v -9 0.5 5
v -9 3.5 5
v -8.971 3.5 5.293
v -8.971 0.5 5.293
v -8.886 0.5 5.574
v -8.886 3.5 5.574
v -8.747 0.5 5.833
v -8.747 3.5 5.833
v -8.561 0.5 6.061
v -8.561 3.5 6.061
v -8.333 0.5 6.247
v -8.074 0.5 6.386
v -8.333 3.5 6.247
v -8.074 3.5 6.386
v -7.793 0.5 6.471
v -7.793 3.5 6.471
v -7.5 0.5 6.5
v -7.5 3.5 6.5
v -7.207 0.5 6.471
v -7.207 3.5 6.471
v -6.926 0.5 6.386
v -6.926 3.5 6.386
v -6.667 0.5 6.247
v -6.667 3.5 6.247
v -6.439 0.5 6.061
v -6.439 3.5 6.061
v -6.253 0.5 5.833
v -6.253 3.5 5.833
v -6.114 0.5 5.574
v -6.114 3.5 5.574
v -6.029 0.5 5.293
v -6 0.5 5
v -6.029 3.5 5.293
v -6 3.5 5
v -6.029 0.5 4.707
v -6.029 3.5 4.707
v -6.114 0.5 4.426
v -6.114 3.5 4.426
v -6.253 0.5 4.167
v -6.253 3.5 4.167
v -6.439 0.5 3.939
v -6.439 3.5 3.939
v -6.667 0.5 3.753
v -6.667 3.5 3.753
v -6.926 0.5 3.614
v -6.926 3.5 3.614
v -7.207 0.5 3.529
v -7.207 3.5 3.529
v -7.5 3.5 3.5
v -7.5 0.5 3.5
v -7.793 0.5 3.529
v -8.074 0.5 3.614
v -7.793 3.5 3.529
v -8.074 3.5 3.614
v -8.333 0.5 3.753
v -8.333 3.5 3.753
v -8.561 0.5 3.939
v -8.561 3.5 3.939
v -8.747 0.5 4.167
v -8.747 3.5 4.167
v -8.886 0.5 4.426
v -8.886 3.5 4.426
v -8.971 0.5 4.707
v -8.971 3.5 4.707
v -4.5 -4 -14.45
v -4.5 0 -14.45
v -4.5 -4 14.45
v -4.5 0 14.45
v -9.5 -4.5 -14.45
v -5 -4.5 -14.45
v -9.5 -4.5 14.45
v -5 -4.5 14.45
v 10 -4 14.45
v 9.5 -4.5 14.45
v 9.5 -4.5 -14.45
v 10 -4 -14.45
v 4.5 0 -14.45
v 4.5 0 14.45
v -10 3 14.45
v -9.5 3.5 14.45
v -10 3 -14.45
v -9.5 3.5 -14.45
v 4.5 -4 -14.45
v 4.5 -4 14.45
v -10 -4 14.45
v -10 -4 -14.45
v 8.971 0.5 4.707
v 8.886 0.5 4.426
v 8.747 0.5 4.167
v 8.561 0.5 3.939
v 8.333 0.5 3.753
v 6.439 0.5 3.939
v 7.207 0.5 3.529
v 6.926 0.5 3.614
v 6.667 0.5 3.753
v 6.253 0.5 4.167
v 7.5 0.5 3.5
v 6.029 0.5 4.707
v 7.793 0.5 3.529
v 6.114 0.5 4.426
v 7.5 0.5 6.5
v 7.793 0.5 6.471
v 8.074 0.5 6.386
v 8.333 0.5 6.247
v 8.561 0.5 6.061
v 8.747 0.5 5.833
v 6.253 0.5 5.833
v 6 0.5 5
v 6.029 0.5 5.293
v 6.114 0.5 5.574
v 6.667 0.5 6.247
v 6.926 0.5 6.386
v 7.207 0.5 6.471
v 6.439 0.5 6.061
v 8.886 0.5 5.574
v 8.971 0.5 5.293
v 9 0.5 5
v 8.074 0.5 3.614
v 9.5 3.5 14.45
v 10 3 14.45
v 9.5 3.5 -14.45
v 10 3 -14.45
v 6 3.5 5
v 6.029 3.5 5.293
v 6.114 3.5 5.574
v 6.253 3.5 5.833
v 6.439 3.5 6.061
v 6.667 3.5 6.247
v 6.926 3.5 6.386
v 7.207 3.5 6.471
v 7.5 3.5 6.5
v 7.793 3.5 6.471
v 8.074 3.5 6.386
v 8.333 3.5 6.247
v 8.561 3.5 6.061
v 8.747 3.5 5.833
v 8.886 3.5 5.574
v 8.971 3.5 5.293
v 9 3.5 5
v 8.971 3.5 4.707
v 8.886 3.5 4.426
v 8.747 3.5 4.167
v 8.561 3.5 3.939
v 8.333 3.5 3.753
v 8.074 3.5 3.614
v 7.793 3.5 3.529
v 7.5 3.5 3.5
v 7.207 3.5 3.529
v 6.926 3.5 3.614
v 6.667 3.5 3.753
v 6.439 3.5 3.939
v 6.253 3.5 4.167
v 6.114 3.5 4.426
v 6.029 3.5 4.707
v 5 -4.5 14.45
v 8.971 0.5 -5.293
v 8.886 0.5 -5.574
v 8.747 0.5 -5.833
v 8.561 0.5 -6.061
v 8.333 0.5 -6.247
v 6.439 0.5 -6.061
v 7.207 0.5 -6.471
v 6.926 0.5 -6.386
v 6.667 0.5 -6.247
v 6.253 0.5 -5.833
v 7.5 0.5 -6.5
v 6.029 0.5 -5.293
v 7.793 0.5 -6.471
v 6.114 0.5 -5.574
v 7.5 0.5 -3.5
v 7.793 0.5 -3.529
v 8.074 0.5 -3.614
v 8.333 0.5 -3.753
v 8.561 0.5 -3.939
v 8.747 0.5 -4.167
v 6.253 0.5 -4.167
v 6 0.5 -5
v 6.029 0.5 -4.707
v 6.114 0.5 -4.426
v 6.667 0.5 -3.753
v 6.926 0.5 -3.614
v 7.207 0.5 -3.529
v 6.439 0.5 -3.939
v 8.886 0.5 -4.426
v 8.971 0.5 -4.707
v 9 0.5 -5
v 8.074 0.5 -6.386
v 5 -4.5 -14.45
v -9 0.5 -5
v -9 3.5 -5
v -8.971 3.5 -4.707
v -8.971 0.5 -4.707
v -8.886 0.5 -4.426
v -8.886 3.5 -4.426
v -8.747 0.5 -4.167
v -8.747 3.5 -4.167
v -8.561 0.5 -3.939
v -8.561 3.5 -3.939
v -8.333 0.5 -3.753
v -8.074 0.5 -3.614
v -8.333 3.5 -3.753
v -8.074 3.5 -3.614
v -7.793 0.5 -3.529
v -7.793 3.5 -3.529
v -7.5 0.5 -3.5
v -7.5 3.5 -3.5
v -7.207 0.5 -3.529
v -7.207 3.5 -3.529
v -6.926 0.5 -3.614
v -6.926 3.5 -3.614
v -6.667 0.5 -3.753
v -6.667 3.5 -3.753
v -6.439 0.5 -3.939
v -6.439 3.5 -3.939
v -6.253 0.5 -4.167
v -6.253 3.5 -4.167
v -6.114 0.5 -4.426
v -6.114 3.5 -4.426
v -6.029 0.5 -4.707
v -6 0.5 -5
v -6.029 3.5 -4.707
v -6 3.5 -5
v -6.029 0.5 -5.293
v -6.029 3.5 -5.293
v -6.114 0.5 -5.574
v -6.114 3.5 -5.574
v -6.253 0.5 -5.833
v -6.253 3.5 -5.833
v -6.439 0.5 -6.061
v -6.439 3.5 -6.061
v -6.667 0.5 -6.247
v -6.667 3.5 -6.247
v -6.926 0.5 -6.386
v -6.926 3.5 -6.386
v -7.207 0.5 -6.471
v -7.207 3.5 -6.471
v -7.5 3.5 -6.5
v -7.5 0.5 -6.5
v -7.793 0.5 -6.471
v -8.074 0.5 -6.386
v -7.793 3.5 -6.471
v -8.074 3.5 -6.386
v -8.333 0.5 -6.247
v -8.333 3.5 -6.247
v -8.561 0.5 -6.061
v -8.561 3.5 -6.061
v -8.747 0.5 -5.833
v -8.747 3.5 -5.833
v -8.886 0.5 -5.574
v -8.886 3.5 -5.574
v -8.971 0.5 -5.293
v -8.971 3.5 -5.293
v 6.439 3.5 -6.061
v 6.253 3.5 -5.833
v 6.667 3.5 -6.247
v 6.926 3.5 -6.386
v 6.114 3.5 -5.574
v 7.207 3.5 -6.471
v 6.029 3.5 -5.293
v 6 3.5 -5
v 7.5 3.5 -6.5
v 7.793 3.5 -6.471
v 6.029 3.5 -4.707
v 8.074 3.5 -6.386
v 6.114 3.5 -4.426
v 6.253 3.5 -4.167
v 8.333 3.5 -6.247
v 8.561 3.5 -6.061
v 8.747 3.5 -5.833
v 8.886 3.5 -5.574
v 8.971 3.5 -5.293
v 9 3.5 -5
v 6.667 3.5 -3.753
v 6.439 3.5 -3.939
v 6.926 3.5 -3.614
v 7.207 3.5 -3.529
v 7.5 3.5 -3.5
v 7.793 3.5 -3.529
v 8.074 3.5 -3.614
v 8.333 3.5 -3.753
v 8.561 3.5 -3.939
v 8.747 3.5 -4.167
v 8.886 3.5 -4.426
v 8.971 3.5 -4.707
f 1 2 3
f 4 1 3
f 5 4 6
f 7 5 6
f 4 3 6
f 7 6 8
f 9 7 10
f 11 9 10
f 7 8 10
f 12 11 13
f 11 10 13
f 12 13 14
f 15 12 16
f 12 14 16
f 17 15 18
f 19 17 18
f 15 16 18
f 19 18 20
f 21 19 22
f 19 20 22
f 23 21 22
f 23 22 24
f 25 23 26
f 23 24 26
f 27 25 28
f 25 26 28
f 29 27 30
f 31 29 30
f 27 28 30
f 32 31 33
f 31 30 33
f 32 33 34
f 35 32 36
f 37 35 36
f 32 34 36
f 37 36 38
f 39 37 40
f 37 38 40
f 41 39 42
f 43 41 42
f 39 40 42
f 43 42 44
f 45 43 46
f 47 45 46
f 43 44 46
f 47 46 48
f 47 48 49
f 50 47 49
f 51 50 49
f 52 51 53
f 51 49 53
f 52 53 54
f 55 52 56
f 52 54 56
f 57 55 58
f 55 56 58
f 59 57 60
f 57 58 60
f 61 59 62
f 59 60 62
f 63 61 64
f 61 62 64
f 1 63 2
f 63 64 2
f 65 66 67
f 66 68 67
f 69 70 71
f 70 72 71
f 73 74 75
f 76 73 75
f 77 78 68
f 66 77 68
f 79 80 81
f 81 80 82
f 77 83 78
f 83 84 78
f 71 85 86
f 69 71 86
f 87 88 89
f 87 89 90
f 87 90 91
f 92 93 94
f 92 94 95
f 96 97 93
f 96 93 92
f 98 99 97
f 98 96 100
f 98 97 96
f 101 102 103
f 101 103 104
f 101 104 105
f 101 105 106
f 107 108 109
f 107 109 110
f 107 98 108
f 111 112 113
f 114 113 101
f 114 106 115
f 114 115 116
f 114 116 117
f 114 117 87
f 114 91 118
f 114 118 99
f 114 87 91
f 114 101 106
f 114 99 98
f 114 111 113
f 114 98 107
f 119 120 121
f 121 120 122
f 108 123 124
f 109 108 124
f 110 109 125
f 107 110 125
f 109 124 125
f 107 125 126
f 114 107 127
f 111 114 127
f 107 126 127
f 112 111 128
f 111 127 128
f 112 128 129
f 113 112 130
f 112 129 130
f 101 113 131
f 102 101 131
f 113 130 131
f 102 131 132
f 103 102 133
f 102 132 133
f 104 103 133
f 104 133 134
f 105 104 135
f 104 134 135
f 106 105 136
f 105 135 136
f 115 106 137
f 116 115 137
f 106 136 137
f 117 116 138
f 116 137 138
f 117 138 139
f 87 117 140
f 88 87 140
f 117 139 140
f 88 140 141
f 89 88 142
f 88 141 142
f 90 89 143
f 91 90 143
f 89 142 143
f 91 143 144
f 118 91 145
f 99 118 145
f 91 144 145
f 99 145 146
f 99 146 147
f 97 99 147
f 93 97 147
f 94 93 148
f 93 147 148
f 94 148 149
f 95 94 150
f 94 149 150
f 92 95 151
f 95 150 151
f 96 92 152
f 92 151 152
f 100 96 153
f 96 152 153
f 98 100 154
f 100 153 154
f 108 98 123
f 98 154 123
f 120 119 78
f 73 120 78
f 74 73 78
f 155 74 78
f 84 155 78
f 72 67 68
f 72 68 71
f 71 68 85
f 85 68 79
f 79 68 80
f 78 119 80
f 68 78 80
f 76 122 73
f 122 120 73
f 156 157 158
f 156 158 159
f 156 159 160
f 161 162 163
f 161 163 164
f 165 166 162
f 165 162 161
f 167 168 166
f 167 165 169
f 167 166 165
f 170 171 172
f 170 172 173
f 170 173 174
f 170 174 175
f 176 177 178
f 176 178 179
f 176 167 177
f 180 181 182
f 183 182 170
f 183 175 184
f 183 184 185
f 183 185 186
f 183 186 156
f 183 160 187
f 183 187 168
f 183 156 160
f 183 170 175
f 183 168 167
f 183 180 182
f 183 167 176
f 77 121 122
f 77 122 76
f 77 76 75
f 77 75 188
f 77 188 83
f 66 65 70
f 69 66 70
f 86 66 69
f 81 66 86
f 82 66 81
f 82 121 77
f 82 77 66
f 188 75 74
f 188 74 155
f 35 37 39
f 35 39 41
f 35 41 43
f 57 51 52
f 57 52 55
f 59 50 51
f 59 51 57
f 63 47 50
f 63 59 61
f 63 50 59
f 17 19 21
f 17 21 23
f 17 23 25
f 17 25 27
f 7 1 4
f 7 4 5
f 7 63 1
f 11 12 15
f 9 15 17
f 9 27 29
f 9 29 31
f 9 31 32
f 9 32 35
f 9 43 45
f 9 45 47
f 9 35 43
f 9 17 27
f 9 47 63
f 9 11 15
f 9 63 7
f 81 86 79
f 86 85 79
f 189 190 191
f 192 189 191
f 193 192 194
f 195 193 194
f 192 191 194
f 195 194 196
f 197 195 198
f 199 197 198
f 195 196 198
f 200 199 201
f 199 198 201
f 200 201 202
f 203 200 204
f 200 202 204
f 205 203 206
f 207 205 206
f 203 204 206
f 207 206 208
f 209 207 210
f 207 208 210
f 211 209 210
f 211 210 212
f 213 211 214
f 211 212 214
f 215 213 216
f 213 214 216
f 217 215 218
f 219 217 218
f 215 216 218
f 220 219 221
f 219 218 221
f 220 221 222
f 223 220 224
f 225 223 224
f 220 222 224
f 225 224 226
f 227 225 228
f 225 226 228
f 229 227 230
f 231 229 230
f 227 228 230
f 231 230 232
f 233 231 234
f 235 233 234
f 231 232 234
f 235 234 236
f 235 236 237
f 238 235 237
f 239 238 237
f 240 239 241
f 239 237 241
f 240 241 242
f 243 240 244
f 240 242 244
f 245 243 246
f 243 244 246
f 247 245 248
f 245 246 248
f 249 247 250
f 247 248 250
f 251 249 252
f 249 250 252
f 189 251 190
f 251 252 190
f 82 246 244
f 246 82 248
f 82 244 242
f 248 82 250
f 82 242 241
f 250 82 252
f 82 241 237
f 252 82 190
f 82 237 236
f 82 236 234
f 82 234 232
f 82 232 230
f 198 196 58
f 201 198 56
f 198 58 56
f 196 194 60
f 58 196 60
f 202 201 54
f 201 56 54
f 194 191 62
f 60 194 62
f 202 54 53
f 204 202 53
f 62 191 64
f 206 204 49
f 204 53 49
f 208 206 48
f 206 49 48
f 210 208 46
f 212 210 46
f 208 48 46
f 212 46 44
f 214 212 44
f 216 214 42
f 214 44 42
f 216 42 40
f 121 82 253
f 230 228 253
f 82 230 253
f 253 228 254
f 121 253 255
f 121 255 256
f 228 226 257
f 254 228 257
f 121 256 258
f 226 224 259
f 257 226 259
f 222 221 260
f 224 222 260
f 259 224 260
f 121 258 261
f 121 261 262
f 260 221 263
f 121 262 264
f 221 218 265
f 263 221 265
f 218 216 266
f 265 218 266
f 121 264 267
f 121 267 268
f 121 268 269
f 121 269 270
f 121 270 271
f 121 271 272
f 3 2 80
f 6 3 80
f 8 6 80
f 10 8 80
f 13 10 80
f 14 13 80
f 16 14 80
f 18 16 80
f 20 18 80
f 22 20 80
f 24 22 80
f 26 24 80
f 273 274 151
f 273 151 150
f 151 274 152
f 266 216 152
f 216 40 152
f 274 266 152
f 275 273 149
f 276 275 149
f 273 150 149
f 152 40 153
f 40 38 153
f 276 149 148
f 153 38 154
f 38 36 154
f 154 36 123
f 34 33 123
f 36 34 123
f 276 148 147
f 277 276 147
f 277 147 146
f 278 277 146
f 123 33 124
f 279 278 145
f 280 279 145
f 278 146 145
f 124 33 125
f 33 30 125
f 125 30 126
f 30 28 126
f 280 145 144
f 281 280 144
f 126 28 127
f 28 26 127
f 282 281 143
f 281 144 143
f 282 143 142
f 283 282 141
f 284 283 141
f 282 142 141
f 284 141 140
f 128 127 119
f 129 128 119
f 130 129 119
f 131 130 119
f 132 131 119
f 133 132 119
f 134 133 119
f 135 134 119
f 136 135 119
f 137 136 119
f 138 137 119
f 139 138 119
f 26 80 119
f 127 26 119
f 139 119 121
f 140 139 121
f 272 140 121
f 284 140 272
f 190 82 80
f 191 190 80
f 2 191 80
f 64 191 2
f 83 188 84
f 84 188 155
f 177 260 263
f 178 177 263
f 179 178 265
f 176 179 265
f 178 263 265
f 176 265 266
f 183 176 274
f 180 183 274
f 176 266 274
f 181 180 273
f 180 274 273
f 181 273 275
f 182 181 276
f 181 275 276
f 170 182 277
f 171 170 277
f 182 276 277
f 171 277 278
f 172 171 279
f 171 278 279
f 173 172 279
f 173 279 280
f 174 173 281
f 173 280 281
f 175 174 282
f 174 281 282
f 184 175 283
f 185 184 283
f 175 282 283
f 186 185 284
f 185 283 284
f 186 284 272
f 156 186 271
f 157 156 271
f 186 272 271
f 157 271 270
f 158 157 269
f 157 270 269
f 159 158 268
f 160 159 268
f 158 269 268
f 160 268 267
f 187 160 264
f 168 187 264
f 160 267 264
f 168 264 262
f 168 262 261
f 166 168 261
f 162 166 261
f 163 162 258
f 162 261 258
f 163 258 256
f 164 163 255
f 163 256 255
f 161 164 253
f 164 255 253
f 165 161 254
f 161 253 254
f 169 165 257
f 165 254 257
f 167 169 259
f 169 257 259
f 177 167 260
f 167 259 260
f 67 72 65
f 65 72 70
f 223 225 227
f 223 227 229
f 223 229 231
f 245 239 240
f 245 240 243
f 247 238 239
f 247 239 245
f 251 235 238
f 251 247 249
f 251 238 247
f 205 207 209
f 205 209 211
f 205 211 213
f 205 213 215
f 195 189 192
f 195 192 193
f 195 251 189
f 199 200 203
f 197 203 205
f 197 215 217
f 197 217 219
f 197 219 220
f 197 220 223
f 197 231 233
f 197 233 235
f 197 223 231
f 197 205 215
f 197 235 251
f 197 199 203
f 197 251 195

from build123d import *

# Parameters (mm, degrees)
EXTRUDE_1_DEPTH     = 14.45
SKETCH_2_R          = 1.5
CUT_EXTRUDE_1_DEPTH = 3
CHAMFER_1_SIZE      = 0.5


with BuildPart() as part:
    # 草图1 → 凸台-拉伸1 (new, symmetric)
    with BuildSketch(Plane.XY):
        Polygon((-4.5, 0), (-4.5, -4.5), (-10, -4.5), (-10, 3.5), (10, 3.5), (10, -4.5), (4.5, -4.5), (4.5, 0), align=None)
    extrude(amount=EXTRUDE_1_DEPTH, both=True)

    # 草图2 → 切除-拉伸1 (cut)
    with BuildSketch(Plane(origin=(0, 3.5, 0), x_dir=(1, 0, 0), z_dir=(0, 1, 0))):
        with Locations(Location((-7.5, 5, 0), (0, 0, 180))):
            Circle(SKETCH_2_R)
        with Locations(Location((7.5, 5, 0), (0, 0, 180))):
            Circle(SKETCH_2_R)
        with Locations(Location((-7.5, -5, 0), (0, 0, 180))):
            Circle(SKETCH_2_R)
        with Locations(Location((7.5, -5, 0), (0, 0, 180))):
            Circle(SKETCH_2_R)
    extrude(amount=-CUT_EXTRUDE_1_DEPTH, mode=Mode.SUBTRACT)

    # 倒角1
    chamfer_1_edges = [part.edges().sort_by_distance(p)[0] for p in [
        (-4.5, -4.5, 0),
        (-10, -4.5, 0),
        (-10, 3.5, 0),
        (10, 3.5, 0),
        (10, -4.5, 0),
        (4.5, -4.5, 0),
    ]]
    chamfer(chamfer_1_edges, length=CHAMFER_1_SIZE)


solid = part.part
